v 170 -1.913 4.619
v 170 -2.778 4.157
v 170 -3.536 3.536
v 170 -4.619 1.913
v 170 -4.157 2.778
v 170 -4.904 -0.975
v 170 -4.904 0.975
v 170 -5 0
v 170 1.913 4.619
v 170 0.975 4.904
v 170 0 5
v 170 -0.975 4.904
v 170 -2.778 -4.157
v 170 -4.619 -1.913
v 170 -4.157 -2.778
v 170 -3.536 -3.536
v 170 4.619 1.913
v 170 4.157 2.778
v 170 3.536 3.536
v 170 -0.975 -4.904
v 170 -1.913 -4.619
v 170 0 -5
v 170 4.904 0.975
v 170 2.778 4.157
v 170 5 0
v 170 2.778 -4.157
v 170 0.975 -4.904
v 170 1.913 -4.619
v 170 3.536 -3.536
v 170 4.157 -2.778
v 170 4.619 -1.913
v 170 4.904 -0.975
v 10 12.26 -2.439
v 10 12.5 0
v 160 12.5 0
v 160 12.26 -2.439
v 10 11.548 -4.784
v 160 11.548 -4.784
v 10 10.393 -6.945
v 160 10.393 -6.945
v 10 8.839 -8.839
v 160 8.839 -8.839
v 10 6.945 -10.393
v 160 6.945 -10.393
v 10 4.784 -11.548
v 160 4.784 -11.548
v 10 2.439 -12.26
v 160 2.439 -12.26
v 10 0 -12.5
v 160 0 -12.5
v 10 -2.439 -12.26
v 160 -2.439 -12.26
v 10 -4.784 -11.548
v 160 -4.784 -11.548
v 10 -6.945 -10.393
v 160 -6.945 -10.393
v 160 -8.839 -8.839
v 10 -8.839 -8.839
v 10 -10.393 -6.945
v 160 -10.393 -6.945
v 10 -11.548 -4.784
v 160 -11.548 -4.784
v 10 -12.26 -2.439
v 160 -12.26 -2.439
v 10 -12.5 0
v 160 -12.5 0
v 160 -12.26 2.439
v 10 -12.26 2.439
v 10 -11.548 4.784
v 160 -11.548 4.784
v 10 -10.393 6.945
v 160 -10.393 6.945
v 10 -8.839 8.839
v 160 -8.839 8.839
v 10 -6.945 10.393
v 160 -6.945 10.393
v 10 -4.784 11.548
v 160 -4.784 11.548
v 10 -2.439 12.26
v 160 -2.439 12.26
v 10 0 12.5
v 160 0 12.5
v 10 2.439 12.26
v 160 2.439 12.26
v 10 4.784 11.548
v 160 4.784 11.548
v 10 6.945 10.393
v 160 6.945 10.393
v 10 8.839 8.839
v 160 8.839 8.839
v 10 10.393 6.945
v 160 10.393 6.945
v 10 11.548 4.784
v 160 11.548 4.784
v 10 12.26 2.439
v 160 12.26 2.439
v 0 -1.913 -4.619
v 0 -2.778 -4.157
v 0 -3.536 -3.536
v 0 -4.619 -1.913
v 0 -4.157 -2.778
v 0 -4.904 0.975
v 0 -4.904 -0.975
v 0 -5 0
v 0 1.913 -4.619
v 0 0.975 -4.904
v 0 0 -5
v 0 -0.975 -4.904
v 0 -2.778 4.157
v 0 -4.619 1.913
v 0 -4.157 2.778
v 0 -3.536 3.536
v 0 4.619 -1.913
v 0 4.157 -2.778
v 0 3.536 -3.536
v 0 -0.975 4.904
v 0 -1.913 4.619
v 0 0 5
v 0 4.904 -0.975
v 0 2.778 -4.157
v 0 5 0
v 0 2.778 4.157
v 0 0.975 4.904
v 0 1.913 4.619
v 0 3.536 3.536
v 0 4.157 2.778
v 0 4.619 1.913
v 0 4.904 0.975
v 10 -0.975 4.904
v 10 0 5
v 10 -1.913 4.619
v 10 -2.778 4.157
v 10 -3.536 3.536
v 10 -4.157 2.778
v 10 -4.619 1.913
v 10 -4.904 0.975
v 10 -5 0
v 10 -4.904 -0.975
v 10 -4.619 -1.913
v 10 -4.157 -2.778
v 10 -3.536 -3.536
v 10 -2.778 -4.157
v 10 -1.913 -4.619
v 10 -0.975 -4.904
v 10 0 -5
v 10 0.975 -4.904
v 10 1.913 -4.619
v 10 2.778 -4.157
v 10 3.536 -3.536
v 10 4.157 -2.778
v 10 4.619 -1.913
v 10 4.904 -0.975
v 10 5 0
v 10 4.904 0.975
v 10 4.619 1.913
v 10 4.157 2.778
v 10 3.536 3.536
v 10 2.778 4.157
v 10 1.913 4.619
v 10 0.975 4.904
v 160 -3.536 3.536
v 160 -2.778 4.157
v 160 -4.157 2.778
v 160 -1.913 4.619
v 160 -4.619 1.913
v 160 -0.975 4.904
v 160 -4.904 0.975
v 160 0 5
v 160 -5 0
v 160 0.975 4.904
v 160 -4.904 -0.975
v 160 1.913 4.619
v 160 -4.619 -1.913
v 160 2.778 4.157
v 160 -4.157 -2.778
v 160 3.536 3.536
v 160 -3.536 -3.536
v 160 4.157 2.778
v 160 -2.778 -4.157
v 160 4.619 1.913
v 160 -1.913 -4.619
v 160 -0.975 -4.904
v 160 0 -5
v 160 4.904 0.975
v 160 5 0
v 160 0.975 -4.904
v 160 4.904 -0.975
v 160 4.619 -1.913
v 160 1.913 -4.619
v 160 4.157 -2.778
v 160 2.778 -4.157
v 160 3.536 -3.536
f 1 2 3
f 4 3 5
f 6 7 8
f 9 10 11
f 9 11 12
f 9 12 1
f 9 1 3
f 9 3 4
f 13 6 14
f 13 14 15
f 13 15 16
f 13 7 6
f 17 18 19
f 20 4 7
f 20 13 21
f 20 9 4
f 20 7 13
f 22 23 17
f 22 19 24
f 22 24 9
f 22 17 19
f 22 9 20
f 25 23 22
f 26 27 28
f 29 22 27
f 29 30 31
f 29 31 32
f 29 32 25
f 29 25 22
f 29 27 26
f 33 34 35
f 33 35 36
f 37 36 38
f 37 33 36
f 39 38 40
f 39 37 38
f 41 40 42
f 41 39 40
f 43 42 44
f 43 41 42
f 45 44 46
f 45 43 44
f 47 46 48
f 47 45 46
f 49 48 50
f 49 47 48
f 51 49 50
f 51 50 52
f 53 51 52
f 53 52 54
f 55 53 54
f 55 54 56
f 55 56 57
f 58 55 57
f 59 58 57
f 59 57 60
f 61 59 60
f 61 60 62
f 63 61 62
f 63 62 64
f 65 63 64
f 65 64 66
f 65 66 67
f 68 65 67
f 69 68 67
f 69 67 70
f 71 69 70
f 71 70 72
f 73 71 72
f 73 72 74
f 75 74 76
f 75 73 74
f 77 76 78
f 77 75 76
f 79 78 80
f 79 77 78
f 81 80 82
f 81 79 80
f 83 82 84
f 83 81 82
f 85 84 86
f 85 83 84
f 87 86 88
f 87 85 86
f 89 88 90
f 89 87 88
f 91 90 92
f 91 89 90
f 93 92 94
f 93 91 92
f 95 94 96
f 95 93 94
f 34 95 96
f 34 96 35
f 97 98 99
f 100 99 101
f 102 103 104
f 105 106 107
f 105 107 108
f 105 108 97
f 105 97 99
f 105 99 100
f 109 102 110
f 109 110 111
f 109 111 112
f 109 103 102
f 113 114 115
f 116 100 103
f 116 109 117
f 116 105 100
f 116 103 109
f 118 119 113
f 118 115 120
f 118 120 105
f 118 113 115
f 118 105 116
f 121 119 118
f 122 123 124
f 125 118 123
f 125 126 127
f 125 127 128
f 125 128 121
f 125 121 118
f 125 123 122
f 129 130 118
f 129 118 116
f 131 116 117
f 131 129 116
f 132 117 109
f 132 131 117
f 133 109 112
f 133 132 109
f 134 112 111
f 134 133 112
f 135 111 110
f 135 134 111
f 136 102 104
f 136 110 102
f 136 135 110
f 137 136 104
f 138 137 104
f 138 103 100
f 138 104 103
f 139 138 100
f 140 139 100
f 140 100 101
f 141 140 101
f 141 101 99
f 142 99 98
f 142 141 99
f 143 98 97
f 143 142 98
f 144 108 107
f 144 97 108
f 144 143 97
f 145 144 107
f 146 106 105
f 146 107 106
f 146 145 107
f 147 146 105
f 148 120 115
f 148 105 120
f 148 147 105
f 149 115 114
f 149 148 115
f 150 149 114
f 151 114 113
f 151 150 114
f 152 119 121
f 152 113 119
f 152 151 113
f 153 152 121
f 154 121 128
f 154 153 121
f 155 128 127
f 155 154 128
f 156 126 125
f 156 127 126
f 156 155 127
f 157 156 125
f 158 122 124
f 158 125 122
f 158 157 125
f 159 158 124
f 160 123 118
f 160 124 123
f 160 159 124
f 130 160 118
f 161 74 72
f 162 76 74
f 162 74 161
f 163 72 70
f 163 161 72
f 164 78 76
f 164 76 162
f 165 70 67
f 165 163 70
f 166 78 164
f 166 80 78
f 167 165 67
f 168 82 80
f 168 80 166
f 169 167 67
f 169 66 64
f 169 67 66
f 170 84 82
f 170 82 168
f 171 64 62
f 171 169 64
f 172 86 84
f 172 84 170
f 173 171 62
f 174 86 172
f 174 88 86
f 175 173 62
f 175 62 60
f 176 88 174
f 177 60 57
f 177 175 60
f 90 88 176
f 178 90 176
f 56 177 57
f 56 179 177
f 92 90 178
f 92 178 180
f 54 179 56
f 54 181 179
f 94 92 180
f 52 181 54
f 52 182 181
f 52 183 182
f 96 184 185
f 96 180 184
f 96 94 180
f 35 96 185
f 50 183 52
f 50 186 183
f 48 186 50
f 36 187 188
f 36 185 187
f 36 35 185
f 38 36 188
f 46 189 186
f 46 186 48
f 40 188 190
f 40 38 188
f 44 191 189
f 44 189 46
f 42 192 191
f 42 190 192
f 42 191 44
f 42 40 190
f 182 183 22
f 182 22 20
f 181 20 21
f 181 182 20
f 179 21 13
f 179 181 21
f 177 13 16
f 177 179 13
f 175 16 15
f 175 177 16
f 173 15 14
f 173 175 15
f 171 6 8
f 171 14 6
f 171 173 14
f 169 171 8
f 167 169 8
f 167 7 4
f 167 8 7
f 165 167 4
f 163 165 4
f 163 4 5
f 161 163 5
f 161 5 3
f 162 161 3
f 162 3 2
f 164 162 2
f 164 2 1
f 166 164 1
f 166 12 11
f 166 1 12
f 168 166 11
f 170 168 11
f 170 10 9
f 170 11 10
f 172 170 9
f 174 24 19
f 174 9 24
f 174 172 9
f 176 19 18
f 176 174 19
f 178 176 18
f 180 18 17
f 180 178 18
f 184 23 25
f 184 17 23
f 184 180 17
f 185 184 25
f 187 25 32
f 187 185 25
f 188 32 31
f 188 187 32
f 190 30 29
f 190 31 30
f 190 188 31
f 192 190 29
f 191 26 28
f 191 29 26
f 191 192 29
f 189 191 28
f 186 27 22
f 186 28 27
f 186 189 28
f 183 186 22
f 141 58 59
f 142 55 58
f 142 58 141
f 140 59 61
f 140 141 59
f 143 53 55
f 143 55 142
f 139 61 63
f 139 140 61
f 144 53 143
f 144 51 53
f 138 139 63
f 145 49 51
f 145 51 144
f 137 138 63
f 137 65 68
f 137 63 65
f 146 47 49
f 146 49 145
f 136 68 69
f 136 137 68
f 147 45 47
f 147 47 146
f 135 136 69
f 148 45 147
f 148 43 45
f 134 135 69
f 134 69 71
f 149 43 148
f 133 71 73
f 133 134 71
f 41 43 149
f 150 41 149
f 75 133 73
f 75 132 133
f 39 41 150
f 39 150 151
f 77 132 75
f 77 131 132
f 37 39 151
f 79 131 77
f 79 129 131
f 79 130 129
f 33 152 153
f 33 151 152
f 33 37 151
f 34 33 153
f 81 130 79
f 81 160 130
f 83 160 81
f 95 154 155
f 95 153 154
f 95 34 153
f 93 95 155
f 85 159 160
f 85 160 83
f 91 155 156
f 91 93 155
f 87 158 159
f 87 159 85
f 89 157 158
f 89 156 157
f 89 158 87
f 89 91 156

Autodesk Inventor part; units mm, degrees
ref_plane "YZ Plane" through (0, 0, 0) normal (1, 0, 0) x (0, 1, 0)
ref_plane "XZ Plane" through (0, 0, 0) normal (0, 1, 0) x (-1, 0, 0)
ref_plane "XY Plane" through (0, 0, 0) normal (0, 0, 1) x (1, 0, 0)
sketch "Sketch1" plane through (0, 0, 0) normal (1, 0, 0) x (0, 1, 0)
  circle A0 centre (0, 0) radius 12.5
  dimension "d0" = 25
extrude "Extrusion1" add sketch "Sketch1" along normal blind 170
sketch "Sketch2" plane through (170, 0, 0) normal (1, 0, 0) x (0, 0, -1)
  circle A0 centre (0, 0) radius 12.5
  dimension "d3" = 25
extrude "Extrusion2" cut sketch "Sketch2" against normal blind 10
sketch "Sketch3" plane through (160, 0, 0) normal (1, 0, 0) x (0, 0, -1)
  circle A0 centre (0, 0) radius 5
  dimension "d6" = 10
extrude "Extrusion3" add sketch "Sketch3" along normal blind 10
sketch "Sketch4" plane through (0, 0, 0) normal (-1, 0, 0) x (0, 0, 1)
  circle A0 centre (0, 0) radius 12.5
  dimension "d9" = 25
extrude "Extrusion4" cut sketch "Sketch4" against normal blind 10
sketch "Sketch5" plane through (10, 0, 0) normal (-1, 0, 0) x (0, 0, 1)
  circle A0 centre (0, 0) radius 5 projected
  circle A1 centre (0, 0) radius 5
extrude "Extrusion5" add sketch "Sketch5" along normal blind 10
properties part number "laser" material "Glass"
